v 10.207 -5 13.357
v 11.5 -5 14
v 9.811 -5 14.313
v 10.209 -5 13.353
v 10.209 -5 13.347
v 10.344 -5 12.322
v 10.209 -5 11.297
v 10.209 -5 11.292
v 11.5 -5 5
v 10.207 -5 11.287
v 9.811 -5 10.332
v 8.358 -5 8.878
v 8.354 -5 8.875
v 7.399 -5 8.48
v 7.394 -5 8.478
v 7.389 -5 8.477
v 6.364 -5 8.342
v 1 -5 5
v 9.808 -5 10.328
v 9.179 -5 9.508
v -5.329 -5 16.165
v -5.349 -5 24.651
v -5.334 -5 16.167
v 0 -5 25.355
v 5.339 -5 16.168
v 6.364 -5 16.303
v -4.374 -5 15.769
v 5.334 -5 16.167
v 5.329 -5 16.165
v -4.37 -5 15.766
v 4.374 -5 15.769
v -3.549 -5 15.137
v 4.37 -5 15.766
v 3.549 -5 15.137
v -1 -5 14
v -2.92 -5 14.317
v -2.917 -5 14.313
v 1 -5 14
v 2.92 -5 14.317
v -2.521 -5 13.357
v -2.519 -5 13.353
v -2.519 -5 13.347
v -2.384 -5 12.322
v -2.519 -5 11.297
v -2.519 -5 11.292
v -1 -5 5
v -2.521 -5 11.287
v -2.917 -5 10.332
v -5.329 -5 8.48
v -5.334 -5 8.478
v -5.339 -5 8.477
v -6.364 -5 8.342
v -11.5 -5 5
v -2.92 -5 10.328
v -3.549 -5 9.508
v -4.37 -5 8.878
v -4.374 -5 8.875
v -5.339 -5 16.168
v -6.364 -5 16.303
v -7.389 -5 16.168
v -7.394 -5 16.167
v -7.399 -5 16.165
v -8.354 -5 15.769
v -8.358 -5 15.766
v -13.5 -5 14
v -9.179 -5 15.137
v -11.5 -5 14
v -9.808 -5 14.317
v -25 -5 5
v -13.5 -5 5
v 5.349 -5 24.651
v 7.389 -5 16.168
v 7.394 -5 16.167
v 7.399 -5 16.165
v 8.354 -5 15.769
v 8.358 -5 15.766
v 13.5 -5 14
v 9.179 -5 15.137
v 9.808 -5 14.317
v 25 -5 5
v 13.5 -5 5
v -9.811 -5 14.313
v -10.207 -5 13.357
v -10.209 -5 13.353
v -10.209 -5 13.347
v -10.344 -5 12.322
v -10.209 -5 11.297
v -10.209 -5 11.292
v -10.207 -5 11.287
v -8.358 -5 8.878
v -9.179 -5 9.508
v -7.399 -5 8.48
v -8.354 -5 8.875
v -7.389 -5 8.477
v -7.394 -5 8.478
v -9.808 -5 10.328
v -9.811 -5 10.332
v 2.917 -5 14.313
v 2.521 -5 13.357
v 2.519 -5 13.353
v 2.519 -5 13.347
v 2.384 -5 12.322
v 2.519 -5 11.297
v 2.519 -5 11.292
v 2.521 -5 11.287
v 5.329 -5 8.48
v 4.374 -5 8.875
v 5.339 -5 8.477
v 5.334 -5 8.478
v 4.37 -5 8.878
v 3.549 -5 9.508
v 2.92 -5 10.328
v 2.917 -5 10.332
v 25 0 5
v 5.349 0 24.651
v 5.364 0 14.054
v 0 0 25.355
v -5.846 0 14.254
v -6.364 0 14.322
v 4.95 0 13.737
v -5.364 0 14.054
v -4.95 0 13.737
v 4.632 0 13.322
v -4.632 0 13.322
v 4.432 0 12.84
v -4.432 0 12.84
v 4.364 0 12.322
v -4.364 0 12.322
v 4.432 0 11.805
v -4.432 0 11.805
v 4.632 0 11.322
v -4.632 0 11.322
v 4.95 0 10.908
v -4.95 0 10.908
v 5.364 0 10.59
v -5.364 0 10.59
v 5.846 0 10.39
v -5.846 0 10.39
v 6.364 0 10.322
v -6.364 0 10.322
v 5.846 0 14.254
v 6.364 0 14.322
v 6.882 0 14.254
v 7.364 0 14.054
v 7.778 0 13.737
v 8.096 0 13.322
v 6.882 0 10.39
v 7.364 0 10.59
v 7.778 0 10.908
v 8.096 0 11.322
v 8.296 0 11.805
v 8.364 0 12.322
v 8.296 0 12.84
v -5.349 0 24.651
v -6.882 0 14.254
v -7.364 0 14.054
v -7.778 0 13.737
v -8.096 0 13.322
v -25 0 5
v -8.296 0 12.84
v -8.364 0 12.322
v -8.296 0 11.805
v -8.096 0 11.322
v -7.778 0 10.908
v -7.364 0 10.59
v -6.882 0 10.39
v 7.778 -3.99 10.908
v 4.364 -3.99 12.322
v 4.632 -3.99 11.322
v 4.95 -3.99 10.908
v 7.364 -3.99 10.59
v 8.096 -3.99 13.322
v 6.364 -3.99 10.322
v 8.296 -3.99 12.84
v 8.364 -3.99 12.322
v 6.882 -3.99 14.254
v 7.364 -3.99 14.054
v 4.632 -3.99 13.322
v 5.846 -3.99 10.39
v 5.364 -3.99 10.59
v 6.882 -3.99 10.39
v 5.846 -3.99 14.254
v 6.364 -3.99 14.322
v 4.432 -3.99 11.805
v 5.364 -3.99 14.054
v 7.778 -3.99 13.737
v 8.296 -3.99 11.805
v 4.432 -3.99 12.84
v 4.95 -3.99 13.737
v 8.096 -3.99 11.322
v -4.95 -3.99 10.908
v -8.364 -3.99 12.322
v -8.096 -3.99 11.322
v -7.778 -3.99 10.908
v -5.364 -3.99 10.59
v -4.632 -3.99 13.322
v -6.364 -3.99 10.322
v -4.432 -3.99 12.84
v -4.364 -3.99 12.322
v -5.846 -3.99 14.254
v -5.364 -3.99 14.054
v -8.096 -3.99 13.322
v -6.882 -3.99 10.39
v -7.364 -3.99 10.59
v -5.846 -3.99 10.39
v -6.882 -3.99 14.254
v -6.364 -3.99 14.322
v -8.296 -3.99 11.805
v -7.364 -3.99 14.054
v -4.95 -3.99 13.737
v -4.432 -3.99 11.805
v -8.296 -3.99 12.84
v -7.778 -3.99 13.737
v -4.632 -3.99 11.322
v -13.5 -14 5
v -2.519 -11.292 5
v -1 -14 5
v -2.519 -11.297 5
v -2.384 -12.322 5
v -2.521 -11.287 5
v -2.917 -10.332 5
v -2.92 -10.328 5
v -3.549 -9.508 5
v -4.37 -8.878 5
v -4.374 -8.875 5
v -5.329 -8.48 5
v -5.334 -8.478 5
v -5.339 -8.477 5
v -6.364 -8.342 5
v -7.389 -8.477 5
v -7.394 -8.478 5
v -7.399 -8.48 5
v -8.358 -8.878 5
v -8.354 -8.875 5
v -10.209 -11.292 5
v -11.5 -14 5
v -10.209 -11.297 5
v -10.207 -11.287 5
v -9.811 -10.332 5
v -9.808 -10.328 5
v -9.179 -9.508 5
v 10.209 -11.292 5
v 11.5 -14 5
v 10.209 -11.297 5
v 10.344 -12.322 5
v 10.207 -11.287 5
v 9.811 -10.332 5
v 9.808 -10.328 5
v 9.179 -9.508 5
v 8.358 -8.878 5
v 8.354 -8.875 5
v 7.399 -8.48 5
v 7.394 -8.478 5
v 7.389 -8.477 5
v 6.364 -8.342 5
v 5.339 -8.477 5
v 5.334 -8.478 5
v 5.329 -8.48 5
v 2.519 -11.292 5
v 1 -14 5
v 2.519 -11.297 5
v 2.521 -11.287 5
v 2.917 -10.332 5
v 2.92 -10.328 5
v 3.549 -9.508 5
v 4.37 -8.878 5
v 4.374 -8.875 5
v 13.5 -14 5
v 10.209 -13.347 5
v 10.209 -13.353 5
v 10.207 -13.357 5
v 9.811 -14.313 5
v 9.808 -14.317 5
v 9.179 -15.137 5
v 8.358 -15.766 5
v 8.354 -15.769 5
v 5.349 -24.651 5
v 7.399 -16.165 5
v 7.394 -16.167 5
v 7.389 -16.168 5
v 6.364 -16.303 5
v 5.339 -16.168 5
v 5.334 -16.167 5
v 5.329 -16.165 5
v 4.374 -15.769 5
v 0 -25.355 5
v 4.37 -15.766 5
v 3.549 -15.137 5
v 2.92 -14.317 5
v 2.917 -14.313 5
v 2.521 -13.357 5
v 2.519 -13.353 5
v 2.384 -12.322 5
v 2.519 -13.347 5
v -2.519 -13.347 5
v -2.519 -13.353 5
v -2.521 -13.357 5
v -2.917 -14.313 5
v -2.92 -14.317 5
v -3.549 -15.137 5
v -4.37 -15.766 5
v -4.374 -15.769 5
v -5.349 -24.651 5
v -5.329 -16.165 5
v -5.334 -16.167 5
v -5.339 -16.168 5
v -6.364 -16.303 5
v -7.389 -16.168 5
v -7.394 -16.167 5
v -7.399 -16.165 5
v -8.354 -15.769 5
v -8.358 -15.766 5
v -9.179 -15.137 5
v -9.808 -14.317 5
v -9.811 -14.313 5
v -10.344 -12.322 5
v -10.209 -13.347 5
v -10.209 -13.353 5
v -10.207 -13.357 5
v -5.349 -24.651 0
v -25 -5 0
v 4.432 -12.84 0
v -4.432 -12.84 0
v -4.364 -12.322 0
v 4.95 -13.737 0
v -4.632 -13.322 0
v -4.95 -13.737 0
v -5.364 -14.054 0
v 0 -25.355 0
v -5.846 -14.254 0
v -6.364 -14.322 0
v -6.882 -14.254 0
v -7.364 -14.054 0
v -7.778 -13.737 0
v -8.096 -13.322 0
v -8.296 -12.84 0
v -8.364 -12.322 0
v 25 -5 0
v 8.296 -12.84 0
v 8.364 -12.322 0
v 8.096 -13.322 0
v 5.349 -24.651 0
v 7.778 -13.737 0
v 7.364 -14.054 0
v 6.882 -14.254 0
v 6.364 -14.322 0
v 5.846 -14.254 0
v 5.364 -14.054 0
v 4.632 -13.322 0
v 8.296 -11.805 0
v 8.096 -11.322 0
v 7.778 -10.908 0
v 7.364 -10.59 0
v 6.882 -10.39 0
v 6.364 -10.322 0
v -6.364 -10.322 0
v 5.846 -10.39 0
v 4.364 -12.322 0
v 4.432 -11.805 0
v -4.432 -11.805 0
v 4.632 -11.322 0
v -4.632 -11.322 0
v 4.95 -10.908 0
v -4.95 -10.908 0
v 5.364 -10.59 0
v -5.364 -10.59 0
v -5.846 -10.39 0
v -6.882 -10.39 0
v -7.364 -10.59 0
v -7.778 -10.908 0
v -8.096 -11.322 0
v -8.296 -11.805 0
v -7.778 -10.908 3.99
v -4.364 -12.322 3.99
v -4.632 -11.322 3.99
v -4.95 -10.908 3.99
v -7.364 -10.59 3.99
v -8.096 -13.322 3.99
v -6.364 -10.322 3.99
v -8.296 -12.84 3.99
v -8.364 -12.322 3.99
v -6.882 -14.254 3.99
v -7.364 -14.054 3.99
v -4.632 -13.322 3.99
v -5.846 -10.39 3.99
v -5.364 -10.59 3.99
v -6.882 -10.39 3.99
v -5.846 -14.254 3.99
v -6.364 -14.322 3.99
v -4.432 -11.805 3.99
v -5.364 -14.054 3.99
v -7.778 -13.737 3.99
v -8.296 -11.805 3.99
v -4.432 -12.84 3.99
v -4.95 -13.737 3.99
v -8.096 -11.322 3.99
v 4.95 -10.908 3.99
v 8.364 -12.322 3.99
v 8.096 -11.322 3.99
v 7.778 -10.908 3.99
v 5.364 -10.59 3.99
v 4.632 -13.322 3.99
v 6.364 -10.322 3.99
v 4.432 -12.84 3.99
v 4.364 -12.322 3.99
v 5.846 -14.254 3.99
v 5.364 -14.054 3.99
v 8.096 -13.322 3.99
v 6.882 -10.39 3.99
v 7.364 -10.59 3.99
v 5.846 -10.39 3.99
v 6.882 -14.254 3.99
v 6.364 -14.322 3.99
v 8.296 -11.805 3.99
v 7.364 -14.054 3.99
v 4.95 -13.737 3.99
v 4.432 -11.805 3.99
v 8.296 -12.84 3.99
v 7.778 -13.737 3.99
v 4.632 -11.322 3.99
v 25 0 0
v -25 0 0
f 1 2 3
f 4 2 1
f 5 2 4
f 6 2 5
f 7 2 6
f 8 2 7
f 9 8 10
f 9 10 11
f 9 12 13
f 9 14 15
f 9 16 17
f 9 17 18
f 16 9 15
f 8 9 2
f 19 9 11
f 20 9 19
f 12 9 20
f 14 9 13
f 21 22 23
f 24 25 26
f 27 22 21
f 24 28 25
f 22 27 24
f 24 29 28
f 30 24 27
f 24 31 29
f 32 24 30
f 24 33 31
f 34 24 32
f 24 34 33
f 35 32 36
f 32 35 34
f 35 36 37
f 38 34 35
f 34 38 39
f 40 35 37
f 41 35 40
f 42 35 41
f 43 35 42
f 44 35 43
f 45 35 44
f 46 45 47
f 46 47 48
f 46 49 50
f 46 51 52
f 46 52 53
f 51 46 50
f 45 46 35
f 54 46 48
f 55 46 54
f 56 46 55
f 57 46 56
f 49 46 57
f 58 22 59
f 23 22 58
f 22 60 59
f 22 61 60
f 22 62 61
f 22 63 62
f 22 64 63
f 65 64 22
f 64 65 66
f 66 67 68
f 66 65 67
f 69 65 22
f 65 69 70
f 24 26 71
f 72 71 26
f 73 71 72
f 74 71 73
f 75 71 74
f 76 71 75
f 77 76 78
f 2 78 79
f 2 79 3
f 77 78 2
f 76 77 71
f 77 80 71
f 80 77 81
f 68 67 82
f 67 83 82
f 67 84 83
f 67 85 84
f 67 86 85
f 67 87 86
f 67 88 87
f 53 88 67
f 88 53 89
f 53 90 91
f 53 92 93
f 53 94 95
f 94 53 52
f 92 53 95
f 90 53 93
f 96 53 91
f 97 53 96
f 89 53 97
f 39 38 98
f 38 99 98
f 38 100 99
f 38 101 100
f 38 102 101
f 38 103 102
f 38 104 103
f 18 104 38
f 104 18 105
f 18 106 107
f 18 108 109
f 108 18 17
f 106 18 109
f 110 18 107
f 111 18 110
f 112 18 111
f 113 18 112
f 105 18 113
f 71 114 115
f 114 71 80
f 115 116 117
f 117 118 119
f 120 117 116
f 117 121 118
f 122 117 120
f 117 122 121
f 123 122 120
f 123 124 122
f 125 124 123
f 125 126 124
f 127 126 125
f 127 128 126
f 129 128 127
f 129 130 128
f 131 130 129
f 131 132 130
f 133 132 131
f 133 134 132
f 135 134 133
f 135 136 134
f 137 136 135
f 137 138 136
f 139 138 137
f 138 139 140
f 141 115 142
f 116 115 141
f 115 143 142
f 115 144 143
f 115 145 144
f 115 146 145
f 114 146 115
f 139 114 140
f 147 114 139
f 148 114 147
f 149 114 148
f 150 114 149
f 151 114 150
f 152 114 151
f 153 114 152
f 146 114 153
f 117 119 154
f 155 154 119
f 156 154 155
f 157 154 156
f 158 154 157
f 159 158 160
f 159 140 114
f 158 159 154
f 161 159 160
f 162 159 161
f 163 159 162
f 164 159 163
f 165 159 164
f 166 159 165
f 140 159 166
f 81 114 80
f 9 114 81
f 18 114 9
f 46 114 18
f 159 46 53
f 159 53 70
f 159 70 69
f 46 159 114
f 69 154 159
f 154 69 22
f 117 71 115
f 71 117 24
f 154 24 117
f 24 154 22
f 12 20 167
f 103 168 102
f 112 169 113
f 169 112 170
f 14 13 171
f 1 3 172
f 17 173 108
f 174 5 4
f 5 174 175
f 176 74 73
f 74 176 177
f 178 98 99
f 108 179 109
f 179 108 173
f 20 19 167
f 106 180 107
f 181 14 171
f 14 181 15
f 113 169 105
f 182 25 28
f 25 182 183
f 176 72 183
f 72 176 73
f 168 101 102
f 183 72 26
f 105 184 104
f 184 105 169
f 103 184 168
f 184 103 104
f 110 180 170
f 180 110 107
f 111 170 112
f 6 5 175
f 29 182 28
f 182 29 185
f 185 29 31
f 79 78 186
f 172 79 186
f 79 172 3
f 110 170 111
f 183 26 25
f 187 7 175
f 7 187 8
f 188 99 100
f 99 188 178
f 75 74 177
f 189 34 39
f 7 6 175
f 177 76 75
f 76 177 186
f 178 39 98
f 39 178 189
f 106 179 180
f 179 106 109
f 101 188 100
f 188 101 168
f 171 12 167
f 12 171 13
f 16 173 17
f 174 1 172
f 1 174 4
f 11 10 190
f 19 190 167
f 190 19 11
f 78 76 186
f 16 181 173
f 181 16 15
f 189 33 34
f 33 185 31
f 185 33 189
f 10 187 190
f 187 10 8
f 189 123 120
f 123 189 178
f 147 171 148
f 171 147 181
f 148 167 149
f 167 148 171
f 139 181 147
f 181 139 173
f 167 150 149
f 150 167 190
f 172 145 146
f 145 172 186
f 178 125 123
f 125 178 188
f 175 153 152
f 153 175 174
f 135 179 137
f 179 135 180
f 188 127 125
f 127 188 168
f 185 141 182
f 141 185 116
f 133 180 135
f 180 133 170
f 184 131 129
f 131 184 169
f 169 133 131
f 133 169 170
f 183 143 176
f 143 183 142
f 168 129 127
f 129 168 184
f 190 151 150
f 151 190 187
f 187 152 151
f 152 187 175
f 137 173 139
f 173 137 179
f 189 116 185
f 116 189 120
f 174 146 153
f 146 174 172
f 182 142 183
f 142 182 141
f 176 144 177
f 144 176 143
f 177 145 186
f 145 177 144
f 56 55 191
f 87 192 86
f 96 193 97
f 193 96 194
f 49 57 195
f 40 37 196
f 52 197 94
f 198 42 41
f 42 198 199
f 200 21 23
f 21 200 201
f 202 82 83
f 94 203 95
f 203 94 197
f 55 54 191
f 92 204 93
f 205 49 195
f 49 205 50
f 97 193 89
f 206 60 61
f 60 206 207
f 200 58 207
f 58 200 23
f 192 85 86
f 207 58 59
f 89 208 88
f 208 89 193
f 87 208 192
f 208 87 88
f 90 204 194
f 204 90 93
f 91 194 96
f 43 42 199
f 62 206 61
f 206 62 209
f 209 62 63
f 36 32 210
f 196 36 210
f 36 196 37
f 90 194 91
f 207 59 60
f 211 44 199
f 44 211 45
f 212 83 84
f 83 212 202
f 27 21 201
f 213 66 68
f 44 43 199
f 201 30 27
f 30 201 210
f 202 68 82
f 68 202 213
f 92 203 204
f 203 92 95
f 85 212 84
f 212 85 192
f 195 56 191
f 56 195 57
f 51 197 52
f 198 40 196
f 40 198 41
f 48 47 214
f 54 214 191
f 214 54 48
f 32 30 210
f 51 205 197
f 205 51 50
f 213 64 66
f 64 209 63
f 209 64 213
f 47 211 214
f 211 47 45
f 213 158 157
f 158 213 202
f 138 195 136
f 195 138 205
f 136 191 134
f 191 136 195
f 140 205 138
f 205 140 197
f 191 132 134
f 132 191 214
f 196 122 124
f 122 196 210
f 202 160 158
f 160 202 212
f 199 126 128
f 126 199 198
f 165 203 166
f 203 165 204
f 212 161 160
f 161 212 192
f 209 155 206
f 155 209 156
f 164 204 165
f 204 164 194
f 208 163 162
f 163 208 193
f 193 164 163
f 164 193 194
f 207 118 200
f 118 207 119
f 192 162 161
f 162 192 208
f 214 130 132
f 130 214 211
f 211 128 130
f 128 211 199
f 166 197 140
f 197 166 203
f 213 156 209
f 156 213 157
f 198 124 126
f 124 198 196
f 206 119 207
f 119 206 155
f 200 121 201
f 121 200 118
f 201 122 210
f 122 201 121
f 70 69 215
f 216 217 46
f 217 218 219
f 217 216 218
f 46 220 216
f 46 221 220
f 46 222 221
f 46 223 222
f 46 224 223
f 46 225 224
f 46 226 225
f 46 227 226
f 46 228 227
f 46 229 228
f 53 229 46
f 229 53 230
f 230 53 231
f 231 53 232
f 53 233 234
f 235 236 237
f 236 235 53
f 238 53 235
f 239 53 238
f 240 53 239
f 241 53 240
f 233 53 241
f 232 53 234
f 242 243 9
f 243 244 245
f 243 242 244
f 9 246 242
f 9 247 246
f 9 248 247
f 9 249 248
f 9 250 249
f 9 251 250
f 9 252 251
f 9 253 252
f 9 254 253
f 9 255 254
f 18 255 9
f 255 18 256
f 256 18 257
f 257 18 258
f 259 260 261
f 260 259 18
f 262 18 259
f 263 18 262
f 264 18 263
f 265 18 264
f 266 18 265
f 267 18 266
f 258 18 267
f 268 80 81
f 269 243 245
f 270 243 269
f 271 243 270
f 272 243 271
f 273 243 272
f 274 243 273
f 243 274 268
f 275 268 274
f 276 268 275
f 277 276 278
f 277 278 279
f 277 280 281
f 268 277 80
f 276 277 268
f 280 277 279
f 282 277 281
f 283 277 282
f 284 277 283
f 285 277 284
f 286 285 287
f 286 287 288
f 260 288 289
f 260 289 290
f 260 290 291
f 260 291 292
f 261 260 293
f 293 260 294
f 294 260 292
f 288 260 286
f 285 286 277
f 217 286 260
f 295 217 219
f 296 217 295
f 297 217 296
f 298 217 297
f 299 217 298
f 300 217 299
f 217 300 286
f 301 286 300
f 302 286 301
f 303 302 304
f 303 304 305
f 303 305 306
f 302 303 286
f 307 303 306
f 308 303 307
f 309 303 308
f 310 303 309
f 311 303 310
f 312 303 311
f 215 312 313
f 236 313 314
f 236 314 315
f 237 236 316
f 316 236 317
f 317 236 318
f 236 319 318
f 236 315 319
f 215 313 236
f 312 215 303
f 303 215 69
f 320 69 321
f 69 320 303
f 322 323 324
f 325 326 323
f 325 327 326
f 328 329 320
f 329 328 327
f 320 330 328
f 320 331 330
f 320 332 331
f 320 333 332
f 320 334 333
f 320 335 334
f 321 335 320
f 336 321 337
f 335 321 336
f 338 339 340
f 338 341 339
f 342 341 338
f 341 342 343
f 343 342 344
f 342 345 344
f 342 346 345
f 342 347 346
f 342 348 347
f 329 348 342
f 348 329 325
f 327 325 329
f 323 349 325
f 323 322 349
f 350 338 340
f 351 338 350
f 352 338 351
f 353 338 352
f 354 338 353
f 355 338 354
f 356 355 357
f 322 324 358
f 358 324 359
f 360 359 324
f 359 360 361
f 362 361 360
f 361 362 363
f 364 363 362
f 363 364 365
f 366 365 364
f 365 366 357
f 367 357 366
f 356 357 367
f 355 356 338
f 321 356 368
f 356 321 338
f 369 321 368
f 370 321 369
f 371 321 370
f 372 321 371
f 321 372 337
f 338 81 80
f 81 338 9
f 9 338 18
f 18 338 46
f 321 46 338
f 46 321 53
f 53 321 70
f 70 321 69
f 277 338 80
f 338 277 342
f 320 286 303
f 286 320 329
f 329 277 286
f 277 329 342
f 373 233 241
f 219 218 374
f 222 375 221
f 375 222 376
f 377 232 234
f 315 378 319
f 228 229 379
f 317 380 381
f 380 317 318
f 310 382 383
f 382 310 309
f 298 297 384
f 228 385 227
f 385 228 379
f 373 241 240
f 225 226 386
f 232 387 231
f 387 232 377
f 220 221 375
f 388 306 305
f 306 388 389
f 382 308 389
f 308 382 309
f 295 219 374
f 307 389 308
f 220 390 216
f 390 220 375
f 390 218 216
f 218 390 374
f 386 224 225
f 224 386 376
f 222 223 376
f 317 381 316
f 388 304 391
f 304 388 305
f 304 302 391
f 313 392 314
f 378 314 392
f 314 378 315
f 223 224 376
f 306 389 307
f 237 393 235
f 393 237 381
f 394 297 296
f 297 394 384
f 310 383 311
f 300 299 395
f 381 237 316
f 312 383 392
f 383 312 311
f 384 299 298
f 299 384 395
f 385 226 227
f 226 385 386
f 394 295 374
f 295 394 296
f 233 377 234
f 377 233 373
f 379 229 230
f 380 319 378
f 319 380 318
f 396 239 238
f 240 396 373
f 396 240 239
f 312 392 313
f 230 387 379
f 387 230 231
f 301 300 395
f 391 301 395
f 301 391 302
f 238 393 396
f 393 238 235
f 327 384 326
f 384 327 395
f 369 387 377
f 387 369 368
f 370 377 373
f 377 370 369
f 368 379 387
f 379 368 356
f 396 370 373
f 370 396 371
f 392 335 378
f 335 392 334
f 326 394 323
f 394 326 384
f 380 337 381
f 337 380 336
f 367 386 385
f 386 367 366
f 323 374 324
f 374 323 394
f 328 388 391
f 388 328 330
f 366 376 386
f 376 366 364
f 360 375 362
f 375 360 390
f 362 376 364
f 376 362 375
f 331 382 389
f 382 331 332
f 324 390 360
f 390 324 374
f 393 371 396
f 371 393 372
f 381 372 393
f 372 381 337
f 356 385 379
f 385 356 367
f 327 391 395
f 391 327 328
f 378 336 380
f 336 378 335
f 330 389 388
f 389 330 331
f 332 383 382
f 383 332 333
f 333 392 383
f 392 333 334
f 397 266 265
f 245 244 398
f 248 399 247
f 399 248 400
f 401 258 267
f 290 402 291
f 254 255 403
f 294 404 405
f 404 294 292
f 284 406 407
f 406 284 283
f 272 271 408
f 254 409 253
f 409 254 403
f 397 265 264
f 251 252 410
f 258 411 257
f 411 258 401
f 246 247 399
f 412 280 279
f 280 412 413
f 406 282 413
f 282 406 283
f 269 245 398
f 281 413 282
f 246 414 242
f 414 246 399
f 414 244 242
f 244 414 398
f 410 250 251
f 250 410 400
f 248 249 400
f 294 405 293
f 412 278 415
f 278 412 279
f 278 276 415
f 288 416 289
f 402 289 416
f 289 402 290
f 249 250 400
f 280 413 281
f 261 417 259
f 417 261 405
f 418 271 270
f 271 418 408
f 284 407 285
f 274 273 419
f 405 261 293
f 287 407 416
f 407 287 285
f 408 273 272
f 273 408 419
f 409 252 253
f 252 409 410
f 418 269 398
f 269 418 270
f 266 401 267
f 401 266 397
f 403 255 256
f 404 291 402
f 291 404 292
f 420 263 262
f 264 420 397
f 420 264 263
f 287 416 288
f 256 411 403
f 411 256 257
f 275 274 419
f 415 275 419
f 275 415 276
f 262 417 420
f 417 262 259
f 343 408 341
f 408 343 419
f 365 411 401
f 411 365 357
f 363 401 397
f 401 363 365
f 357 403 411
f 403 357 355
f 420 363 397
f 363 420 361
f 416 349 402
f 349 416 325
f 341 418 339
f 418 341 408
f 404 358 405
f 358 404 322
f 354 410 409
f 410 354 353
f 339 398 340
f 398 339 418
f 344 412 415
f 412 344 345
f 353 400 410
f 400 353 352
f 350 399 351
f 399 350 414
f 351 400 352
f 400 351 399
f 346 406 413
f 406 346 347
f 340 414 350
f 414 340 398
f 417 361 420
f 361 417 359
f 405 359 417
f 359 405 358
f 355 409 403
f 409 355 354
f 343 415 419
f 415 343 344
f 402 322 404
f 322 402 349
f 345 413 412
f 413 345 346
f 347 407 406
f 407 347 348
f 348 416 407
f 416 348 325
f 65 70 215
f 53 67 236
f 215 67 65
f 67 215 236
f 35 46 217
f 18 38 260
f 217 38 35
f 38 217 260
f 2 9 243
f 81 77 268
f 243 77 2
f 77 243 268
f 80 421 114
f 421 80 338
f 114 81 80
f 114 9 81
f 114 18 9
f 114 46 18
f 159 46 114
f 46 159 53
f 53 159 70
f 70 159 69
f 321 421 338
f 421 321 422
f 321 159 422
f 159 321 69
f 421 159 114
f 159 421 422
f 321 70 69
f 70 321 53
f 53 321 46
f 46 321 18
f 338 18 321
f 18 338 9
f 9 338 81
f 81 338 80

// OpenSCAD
// file: triangular_bracket/triangular_bracket.internal.scad
module triangle(edge = 1) {
  polygon(points=[
    [0, 0], [0, edge], [edge, 0]
  ]);
};

// Upright triangle
module triangularPrism(length = 4, width = 0.3) {
    linear_extrude(height = width)
    triangle(length);
};

module support(width, size) {
  rotate([90+45, 0, 0]) rotate([0, 90, 0]) rotate(45) triangularPrism(length = size, width = width);
}

module equidistantSupports(count = 3, inLength = 4) {
  width = 2;
  distance = (inLength) / (count+1);
  translate([-0.5 * inLength, 0, 0])
  translate([-0.5 * width, 0, 0])

  for (i = [1:count]) {
      translate([i*distance, 0, 0]) support(width, size);
  }
}

module screwHole(screwDiameter, headDiameter, headHeight, shaftLength=4) {
    union() {
      translate([0, 0, -0.01]) cylinder(r2 = screwDiameter/2, r1 = headDiameter/2, h = headHeight+0.02, $fn=24);
      translate([0, 0, headHeight]) cylinder(r1 = screwDiameter/2, r2 = screwDiameter/2, h = shaftLength, $fn=24);
    }
}

module side(length, materialWidth) {
  difference() {
    intersection() {
      triangularPrism(length = length, width = materialWidth);
      translate([length/1.25, length/1.25, -materialWidth+1]) cylinder(r1=length, r2=length, h=materialWidth*2, $fn=24);
    }
    //translate([1.3, 1.3]) screwHole(screwDiameter = 0.4, headDiameter = 0.8, headHeight = 0.1);
    translate([17, 8]) screwHole(screwDiameter = 4, headDiameter = 8, headHeight = 1);
    translate([8, 17]) screwHole(screwDiameter = 4, headDiameter = 8, headHeight = 1);
  }
}
// main file
use <triangular_bracket/triangular_bracket.internal.scad>;

// Configurations
materialWidth = 5;
length = sqrt(pow(50, 2) / 2);

supports = 3;
supportSize = 9;

// Computed properties
hyp = sqrt(pow(length, 2) + pow(length, 2));
triangleHeight = sqrt(pow(length, 2) - pow(hyp/2, 2));

module triangular_bracket() {
  translate([0, -materialWidth, 0]) union() {
    // Fill with cube between both sides
    translate([-0.5 * hyp, 0, 0])
      cube([hyp, materialWidth, materialWidth]);

    // Upright side
    translate([0, 0, triangleHeight+materialWidth])
      rotate([-90, 0, 0])
      rotate(45)
      side(length = length, materialWidth = materialWidth);

    // Floor side
    translate([0, -triangleHeight, materialWidth])
      rotate([0, 180, 0])
      rotate(45)
      side(length = length, materialWidth = materialWidth);

    translate([0, 0, materialWidth]) equidistantSupports(count = supports, size = supportSize,inLength = hyp);
  }
}

color("red") triangular_bracket();
